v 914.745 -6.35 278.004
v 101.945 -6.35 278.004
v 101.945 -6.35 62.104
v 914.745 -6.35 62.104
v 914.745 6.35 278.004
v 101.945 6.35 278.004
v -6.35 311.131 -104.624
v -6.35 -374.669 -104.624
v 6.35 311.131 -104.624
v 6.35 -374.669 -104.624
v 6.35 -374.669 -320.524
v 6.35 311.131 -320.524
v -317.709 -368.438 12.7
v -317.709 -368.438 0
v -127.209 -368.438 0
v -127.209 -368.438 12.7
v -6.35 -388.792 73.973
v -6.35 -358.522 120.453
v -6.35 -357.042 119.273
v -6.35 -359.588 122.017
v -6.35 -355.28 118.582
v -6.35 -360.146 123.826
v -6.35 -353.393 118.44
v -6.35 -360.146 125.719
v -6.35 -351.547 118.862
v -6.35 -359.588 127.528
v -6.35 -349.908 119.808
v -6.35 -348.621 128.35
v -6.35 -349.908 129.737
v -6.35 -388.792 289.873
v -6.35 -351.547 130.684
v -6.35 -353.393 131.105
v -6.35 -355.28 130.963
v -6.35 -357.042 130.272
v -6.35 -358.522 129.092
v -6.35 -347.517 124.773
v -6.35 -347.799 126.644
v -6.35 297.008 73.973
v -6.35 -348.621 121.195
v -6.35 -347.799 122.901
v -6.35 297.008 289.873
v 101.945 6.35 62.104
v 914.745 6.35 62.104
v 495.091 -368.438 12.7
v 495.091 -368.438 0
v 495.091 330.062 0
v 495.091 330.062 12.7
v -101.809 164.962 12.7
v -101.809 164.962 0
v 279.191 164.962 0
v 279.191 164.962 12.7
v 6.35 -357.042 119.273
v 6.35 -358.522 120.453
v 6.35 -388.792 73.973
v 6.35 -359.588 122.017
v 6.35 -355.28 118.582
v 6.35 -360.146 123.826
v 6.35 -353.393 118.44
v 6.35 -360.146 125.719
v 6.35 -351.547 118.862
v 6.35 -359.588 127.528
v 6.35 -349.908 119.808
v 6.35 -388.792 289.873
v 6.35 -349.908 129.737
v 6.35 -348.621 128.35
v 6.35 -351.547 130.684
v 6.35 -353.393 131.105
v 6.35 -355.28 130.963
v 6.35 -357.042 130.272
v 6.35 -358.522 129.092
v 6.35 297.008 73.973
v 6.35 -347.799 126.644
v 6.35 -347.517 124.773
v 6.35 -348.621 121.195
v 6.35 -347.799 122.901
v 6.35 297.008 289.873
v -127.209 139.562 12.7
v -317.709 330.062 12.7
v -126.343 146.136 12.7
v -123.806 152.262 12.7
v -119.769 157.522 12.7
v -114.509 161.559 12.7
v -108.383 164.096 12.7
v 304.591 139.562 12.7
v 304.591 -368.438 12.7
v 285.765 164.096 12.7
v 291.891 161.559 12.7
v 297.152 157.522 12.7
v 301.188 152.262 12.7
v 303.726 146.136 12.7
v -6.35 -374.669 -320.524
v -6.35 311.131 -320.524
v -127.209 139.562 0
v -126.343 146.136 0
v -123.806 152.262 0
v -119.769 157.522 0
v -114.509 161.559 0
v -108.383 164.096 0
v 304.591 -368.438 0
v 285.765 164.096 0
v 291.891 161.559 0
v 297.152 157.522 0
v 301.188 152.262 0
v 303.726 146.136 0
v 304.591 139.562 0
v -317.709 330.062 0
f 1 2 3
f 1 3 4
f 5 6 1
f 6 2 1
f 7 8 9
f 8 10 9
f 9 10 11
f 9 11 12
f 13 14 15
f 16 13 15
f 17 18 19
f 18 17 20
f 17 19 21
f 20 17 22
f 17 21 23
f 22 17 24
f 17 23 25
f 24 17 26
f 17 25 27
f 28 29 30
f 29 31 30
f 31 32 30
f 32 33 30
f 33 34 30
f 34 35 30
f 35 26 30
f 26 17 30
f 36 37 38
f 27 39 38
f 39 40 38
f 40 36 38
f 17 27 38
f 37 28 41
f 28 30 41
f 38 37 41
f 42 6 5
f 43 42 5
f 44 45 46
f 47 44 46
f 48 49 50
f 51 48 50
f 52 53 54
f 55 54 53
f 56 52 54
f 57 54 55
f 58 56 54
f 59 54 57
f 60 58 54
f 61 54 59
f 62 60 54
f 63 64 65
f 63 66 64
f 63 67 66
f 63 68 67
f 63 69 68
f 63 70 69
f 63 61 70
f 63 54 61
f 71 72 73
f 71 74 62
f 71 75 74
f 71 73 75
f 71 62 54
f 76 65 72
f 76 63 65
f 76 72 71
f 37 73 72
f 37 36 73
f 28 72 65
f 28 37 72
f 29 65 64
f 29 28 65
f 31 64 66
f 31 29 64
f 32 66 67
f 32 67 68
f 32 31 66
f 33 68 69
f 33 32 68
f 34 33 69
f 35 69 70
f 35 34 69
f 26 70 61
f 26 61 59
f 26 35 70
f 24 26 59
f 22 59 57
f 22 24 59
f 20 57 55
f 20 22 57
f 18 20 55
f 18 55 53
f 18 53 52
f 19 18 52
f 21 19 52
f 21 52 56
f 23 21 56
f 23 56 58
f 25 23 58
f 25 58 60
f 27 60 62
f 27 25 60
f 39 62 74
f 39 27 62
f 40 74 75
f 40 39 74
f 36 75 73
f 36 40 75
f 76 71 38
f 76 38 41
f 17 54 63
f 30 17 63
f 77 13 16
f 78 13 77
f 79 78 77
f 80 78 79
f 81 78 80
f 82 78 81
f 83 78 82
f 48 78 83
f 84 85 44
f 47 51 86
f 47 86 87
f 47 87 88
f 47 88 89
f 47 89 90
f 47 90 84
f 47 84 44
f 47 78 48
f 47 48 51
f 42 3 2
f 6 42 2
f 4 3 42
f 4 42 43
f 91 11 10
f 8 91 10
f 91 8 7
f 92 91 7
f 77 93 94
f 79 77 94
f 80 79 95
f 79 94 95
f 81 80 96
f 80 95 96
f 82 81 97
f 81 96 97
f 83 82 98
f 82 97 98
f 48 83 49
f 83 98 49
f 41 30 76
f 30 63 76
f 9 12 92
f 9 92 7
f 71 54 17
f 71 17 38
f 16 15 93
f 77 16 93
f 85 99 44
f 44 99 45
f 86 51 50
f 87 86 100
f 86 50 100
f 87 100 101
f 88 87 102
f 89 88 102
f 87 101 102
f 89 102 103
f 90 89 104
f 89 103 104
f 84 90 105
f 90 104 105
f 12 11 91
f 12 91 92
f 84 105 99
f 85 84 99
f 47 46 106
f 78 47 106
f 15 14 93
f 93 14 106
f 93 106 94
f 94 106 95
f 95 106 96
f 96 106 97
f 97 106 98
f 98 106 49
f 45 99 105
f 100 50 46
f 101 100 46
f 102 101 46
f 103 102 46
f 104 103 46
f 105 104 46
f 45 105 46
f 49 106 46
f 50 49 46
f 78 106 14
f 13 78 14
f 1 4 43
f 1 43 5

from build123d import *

# Parameters (mm, degrees)
F1_DEPTH = 12.7
F2_W     = 685.8
F2_H     = 215.9
F2_R     = 6.35
F3_DEPTH = 6.35
F4_W     = 685.8
F4_H     = 215.9
F5_DEPTH = 6.35
F6_W     = 812.8
F6_H     = 215.9
F7_DEPTH = 6.35


with BuildPart() as f1:
    # F0 (on Top) → F1 (new body)
    with BuildSketch(Plane.XY):
        with BuildLine():
            Line((-317.7088467273, 330.0617613852), (-317.7088467273, -368.4382386148))
            Line((-317.7088467273, -368.4382386148), (-127.2088467273, -368.4382386148))
            Line((-127.2088467273, -368.4382386148), (-127.2088467273, 139.5617613852))
            ThreePointArc((-127.2088467273, 139.5617613852), (-119.7693589695, 157.5222736273), (-101.8088467273, 164.9617613852))
            Line((-101.8088467273, 164.9617613852), (279.1911532727, 164.9617613852))
            ThreePointArc((279.1911532727, 164.9617613852), (297.1516655148, 157.5222736273), (304.5911532727, 139.5617613852))
            Line((304.5911532727, 139.5617613852), (304.5911532727, -368.4382386148))
            Line((304.5911532727, -368.4382386148), (495.0911532727, -368.4382386148))
            Line((495.0911532727, -368.4382386148), (495.0911532727, 330.0617613852))
            Line((495.0911532727, 330.0617613852), (-317.7088467273, 330.0617613852))
        make_face()
    extrude(amount=F1_DEPTH)


with BuildPart() as f3:
    # F2 (on Right) → F3 (new body, symmetric)
    with BuildSketch(Plane.YZ):
        with Locations((-45.8921939392, 181.9225773215)):
            Rectangle(F2_W, F2_H)
        with Locations((-353.8671939392, 124.7725773215)):
            Circle(F2_R, mode=Mode.SUBTRACT)
    extrude(amount=F3_DEPTH, both=True)


with BuildPart() as f5:
    # F4 (on Right) → F5 (new body, symmetric)
    with BuildSketch(Plane.YZ):
        with Locations((-31.768632142, -212.574288249)):
            Rectangle(F4_W, F4_H)
    extrude(amount=F5_DEPTH, both=True)


with BuildPart() as f7:
    # F6 (on Front) → F7 (new body, symmetric)
    with BuildSketch(Plane.XZ):
        with Locations((508.3448041916, 170.053509903)):
            Rectangle(F6_W, F6_H)
    extrude(amount=F7_DEPTH, both=True)


solid = Compound([f1.part, f3.part, f5.part, f7.part])
